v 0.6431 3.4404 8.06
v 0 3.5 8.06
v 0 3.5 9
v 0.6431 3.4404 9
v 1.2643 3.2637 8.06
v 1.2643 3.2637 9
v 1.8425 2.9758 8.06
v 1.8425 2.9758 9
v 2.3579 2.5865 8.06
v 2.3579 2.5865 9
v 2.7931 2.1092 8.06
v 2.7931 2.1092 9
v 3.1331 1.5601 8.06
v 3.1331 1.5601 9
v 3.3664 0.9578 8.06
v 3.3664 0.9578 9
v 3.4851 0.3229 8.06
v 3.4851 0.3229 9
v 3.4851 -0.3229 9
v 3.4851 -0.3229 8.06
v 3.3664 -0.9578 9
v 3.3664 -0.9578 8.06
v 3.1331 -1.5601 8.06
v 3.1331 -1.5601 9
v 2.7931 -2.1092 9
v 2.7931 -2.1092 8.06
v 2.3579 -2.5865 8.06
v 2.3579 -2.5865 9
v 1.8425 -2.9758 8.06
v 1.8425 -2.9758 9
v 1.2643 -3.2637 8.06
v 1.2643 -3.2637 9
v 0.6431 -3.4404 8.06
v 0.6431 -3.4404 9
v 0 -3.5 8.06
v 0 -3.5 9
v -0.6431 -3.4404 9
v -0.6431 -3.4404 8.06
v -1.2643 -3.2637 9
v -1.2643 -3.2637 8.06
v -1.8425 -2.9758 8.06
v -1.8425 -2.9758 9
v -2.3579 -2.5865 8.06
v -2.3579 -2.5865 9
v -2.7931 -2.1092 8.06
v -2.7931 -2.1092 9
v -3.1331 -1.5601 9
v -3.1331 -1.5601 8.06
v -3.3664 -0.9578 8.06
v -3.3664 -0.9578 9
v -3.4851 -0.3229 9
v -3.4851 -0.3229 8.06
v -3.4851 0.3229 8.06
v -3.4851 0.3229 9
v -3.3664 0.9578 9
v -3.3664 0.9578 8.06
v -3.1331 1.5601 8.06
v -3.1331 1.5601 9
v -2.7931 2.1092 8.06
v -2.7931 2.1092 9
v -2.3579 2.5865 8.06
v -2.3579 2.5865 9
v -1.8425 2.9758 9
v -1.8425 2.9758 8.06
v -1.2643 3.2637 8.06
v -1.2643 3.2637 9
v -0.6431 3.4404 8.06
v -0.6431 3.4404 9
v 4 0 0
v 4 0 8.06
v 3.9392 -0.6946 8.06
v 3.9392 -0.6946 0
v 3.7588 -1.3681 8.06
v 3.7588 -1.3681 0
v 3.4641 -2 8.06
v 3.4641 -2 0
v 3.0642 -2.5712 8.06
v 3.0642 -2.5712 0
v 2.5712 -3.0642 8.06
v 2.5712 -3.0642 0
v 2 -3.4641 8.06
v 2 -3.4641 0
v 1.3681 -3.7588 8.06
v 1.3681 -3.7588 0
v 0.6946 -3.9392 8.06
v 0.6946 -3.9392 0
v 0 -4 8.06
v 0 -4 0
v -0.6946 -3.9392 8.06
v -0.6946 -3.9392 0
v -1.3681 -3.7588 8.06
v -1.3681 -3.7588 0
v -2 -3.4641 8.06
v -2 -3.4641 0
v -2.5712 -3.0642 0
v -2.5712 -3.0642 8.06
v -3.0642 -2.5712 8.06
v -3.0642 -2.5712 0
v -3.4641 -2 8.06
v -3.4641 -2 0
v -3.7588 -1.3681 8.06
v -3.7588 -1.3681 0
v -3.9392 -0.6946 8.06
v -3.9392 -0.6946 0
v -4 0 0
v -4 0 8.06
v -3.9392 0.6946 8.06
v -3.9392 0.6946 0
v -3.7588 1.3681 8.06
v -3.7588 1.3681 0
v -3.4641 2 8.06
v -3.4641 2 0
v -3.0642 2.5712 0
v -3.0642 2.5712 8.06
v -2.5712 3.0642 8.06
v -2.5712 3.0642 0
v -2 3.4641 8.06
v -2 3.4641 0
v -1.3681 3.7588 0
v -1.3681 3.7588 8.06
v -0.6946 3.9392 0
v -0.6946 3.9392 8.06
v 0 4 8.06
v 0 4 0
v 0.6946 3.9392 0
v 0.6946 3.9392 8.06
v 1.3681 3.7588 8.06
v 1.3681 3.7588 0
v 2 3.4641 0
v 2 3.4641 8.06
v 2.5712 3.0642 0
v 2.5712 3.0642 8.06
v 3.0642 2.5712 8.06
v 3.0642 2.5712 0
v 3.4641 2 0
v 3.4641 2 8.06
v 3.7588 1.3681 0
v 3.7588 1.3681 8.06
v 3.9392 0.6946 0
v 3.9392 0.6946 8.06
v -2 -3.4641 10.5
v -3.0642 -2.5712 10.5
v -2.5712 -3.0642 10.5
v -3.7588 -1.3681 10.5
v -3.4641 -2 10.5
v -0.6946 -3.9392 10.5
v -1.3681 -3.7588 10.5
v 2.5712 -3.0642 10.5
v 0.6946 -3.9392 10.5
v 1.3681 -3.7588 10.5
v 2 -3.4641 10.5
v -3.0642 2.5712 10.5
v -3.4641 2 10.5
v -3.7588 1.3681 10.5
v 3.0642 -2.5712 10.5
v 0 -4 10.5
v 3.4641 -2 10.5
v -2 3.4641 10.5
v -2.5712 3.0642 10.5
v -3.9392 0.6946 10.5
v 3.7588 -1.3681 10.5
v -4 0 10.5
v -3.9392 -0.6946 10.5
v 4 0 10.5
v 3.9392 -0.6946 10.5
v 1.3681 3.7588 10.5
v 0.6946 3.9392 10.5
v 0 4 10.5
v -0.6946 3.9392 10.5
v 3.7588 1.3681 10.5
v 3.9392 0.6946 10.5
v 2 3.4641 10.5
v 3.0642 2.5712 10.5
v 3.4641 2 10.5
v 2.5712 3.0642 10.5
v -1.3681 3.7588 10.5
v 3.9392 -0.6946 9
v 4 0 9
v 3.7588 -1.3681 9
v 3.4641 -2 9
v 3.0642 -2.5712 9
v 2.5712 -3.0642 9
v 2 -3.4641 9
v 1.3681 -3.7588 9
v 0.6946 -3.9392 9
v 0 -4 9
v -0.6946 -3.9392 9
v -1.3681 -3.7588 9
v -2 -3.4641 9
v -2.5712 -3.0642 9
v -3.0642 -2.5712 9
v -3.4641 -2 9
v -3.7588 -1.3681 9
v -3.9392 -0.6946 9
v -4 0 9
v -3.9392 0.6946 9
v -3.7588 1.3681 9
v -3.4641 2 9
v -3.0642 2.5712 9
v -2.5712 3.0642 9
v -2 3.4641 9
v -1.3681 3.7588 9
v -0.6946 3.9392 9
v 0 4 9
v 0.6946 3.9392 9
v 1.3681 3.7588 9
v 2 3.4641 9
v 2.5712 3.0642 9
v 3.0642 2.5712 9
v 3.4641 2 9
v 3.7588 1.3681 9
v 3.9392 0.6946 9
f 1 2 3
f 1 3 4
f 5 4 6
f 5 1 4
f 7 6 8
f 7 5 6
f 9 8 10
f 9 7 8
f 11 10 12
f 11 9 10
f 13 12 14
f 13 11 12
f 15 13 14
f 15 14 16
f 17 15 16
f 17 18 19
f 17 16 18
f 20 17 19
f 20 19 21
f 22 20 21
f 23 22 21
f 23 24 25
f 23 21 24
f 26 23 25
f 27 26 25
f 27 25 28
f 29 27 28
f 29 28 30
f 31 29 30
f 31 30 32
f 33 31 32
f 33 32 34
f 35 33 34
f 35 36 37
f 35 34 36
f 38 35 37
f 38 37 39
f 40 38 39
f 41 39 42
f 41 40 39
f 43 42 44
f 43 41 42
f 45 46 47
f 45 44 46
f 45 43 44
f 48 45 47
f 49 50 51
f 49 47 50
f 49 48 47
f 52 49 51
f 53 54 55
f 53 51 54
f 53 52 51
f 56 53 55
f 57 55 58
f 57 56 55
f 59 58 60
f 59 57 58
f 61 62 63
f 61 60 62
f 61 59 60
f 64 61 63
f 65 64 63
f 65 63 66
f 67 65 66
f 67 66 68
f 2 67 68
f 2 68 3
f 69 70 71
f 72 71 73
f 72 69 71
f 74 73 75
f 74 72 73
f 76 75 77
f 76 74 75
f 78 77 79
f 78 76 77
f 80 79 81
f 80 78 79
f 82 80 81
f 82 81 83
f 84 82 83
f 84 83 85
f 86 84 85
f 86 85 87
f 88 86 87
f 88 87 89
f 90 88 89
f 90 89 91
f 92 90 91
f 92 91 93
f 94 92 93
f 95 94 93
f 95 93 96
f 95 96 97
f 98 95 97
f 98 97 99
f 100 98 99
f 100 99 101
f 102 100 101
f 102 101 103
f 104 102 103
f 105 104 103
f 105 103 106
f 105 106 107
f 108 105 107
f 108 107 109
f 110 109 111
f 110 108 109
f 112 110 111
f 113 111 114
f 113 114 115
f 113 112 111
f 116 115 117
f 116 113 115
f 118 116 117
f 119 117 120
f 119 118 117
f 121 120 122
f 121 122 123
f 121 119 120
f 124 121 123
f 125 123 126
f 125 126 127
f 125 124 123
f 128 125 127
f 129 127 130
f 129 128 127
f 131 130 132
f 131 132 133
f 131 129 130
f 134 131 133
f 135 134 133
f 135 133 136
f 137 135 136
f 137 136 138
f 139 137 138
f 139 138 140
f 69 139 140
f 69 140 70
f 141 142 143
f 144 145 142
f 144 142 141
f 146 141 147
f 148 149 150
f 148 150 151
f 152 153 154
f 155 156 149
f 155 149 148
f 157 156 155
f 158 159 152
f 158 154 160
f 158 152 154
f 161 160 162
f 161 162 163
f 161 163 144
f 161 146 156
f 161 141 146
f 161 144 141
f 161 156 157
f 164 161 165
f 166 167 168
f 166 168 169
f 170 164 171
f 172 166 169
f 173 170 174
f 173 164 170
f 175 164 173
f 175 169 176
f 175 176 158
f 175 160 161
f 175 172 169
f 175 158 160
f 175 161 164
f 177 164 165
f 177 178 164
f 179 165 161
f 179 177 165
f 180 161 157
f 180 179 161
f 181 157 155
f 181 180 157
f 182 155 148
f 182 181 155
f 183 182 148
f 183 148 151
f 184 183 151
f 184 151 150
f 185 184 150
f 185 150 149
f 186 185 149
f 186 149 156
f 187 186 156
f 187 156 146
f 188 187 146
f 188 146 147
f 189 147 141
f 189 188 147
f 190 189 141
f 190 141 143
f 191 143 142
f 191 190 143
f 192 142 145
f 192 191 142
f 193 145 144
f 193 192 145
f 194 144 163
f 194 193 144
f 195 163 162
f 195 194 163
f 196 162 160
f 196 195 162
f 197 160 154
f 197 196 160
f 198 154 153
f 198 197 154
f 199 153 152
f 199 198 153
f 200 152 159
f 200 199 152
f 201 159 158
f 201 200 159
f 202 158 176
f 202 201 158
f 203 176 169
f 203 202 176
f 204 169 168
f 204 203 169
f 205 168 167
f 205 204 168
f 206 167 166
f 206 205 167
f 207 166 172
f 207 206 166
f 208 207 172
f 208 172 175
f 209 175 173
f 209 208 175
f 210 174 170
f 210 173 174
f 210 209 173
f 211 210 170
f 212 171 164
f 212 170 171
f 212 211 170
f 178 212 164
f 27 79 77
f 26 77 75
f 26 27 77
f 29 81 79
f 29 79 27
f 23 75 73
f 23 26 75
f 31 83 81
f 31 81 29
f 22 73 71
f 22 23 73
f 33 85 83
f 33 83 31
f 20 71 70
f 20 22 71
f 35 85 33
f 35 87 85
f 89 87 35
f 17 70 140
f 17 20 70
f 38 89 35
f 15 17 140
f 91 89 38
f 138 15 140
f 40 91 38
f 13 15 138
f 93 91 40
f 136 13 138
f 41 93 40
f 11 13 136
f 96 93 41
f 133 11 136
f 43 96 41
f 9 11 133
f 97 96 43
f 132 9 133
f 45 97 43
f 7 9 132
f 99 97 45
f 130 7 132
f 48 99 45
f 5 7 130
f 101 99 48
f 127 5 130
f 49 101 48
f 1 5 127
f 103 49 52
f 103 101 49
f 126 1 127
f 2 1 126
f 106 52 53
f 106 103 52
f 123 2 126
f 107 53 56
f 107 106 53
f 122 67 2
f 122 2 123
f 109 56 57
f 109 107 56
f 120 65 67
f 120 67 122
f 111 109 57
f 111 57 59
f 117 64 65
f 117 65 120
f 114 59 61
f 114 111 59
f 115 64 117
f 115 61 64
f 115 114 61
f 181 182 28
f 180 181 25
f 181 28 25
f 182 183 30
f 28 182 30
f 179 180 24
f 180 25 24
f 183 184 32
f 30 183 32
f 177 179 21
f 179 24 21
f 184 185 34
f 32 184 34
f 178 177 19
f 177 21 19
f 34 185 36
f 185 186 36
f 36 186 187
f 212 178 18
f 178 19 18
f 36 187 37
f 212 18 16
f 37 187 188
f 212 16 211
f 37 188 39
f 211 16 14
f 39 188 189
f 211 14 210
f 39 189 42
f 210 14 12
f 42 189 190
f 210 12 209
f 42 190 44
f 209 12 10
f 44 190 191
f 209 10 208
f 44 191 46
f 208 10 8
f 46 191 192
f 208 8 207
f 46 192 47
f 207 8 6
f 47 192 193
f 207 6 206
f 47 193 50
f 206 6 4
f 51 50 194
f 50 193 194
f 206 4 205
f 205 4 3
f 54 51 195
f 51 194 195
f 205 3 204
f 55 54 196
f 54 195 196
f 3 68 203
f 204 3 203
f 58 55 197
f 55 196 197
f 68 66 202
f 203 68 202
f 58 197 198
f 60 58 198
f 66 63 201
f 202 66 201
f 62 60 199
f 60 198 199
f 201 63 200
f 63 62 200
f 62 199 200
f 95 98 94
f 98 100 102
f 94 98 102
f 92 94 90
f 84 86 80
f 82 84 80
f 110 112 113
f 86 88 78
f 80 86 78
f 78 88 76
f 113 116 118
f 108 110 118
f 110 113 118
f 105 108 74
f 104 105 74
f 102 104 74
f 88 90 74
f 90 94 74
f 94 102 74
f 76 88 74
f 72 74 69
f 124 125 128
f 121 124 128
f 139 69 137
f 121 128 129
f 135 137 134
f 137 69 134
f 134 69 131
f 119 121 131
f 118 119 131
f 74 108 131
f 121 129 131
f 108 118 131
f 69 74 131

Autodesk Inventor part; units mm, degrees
ref_plane "YZ Plane" through (0, 0, 0) normal (1, 0, 0) x (0, 1, 0)
ref_plane "XZ Plane" through (0, 0, 0) normal (0, 1, 0) x (-1, 0, 0)
ref_plane "XY Plane" through (0, 0, 0) normal (0, 0, 1) x (1, 0, 0)
sketch "Sketch1" plane through (0, 0, 0) normal (0, 0, 1) x (1, 0, 0)
  circle A0 centre (0, 0) radius 4
  dimension "d0" = 8
extrude "Extrusion1" add sketch "Sketch1" along normal blind 10.5
sketch "Sketch2" plane through (0, 0, 0) normal (1, 0, 0) x (0, 1, 0)
  line L0 (4.5, 9) -> (3.5, 9)
  line L1 (3.5, 9) -> (3.5, 8.06)
  line L2 (3.5, 8.06) -> (4.5, 8.06)
  line L3 (4.5, 8.06) -> (4.5, 9)
  line L4 (4, 0) -> (4, 10.5) projected
  line L5 (4, 10.5) -> (-4, 10.5) projected
  line L6 (0, -2.2) -> (0, 13.2) projected
  line L7 (2.4774, 8) -> (9.7598, 8) projected
  point P0 (0, 0)
  dimension "d3" = 0.5
  dimension "d4" = 1
  dimension "d5" = 0.94
  dimension "d6" = 1.5
revolve "Revolution1" cut sketch "Sketch2" angle 360 about axis through (0, 0, -10) along (0, 0, 1)
equation "\"d4\" = 2 * d3"
properties part number "AxeJambe" material "Stainless Steel"
